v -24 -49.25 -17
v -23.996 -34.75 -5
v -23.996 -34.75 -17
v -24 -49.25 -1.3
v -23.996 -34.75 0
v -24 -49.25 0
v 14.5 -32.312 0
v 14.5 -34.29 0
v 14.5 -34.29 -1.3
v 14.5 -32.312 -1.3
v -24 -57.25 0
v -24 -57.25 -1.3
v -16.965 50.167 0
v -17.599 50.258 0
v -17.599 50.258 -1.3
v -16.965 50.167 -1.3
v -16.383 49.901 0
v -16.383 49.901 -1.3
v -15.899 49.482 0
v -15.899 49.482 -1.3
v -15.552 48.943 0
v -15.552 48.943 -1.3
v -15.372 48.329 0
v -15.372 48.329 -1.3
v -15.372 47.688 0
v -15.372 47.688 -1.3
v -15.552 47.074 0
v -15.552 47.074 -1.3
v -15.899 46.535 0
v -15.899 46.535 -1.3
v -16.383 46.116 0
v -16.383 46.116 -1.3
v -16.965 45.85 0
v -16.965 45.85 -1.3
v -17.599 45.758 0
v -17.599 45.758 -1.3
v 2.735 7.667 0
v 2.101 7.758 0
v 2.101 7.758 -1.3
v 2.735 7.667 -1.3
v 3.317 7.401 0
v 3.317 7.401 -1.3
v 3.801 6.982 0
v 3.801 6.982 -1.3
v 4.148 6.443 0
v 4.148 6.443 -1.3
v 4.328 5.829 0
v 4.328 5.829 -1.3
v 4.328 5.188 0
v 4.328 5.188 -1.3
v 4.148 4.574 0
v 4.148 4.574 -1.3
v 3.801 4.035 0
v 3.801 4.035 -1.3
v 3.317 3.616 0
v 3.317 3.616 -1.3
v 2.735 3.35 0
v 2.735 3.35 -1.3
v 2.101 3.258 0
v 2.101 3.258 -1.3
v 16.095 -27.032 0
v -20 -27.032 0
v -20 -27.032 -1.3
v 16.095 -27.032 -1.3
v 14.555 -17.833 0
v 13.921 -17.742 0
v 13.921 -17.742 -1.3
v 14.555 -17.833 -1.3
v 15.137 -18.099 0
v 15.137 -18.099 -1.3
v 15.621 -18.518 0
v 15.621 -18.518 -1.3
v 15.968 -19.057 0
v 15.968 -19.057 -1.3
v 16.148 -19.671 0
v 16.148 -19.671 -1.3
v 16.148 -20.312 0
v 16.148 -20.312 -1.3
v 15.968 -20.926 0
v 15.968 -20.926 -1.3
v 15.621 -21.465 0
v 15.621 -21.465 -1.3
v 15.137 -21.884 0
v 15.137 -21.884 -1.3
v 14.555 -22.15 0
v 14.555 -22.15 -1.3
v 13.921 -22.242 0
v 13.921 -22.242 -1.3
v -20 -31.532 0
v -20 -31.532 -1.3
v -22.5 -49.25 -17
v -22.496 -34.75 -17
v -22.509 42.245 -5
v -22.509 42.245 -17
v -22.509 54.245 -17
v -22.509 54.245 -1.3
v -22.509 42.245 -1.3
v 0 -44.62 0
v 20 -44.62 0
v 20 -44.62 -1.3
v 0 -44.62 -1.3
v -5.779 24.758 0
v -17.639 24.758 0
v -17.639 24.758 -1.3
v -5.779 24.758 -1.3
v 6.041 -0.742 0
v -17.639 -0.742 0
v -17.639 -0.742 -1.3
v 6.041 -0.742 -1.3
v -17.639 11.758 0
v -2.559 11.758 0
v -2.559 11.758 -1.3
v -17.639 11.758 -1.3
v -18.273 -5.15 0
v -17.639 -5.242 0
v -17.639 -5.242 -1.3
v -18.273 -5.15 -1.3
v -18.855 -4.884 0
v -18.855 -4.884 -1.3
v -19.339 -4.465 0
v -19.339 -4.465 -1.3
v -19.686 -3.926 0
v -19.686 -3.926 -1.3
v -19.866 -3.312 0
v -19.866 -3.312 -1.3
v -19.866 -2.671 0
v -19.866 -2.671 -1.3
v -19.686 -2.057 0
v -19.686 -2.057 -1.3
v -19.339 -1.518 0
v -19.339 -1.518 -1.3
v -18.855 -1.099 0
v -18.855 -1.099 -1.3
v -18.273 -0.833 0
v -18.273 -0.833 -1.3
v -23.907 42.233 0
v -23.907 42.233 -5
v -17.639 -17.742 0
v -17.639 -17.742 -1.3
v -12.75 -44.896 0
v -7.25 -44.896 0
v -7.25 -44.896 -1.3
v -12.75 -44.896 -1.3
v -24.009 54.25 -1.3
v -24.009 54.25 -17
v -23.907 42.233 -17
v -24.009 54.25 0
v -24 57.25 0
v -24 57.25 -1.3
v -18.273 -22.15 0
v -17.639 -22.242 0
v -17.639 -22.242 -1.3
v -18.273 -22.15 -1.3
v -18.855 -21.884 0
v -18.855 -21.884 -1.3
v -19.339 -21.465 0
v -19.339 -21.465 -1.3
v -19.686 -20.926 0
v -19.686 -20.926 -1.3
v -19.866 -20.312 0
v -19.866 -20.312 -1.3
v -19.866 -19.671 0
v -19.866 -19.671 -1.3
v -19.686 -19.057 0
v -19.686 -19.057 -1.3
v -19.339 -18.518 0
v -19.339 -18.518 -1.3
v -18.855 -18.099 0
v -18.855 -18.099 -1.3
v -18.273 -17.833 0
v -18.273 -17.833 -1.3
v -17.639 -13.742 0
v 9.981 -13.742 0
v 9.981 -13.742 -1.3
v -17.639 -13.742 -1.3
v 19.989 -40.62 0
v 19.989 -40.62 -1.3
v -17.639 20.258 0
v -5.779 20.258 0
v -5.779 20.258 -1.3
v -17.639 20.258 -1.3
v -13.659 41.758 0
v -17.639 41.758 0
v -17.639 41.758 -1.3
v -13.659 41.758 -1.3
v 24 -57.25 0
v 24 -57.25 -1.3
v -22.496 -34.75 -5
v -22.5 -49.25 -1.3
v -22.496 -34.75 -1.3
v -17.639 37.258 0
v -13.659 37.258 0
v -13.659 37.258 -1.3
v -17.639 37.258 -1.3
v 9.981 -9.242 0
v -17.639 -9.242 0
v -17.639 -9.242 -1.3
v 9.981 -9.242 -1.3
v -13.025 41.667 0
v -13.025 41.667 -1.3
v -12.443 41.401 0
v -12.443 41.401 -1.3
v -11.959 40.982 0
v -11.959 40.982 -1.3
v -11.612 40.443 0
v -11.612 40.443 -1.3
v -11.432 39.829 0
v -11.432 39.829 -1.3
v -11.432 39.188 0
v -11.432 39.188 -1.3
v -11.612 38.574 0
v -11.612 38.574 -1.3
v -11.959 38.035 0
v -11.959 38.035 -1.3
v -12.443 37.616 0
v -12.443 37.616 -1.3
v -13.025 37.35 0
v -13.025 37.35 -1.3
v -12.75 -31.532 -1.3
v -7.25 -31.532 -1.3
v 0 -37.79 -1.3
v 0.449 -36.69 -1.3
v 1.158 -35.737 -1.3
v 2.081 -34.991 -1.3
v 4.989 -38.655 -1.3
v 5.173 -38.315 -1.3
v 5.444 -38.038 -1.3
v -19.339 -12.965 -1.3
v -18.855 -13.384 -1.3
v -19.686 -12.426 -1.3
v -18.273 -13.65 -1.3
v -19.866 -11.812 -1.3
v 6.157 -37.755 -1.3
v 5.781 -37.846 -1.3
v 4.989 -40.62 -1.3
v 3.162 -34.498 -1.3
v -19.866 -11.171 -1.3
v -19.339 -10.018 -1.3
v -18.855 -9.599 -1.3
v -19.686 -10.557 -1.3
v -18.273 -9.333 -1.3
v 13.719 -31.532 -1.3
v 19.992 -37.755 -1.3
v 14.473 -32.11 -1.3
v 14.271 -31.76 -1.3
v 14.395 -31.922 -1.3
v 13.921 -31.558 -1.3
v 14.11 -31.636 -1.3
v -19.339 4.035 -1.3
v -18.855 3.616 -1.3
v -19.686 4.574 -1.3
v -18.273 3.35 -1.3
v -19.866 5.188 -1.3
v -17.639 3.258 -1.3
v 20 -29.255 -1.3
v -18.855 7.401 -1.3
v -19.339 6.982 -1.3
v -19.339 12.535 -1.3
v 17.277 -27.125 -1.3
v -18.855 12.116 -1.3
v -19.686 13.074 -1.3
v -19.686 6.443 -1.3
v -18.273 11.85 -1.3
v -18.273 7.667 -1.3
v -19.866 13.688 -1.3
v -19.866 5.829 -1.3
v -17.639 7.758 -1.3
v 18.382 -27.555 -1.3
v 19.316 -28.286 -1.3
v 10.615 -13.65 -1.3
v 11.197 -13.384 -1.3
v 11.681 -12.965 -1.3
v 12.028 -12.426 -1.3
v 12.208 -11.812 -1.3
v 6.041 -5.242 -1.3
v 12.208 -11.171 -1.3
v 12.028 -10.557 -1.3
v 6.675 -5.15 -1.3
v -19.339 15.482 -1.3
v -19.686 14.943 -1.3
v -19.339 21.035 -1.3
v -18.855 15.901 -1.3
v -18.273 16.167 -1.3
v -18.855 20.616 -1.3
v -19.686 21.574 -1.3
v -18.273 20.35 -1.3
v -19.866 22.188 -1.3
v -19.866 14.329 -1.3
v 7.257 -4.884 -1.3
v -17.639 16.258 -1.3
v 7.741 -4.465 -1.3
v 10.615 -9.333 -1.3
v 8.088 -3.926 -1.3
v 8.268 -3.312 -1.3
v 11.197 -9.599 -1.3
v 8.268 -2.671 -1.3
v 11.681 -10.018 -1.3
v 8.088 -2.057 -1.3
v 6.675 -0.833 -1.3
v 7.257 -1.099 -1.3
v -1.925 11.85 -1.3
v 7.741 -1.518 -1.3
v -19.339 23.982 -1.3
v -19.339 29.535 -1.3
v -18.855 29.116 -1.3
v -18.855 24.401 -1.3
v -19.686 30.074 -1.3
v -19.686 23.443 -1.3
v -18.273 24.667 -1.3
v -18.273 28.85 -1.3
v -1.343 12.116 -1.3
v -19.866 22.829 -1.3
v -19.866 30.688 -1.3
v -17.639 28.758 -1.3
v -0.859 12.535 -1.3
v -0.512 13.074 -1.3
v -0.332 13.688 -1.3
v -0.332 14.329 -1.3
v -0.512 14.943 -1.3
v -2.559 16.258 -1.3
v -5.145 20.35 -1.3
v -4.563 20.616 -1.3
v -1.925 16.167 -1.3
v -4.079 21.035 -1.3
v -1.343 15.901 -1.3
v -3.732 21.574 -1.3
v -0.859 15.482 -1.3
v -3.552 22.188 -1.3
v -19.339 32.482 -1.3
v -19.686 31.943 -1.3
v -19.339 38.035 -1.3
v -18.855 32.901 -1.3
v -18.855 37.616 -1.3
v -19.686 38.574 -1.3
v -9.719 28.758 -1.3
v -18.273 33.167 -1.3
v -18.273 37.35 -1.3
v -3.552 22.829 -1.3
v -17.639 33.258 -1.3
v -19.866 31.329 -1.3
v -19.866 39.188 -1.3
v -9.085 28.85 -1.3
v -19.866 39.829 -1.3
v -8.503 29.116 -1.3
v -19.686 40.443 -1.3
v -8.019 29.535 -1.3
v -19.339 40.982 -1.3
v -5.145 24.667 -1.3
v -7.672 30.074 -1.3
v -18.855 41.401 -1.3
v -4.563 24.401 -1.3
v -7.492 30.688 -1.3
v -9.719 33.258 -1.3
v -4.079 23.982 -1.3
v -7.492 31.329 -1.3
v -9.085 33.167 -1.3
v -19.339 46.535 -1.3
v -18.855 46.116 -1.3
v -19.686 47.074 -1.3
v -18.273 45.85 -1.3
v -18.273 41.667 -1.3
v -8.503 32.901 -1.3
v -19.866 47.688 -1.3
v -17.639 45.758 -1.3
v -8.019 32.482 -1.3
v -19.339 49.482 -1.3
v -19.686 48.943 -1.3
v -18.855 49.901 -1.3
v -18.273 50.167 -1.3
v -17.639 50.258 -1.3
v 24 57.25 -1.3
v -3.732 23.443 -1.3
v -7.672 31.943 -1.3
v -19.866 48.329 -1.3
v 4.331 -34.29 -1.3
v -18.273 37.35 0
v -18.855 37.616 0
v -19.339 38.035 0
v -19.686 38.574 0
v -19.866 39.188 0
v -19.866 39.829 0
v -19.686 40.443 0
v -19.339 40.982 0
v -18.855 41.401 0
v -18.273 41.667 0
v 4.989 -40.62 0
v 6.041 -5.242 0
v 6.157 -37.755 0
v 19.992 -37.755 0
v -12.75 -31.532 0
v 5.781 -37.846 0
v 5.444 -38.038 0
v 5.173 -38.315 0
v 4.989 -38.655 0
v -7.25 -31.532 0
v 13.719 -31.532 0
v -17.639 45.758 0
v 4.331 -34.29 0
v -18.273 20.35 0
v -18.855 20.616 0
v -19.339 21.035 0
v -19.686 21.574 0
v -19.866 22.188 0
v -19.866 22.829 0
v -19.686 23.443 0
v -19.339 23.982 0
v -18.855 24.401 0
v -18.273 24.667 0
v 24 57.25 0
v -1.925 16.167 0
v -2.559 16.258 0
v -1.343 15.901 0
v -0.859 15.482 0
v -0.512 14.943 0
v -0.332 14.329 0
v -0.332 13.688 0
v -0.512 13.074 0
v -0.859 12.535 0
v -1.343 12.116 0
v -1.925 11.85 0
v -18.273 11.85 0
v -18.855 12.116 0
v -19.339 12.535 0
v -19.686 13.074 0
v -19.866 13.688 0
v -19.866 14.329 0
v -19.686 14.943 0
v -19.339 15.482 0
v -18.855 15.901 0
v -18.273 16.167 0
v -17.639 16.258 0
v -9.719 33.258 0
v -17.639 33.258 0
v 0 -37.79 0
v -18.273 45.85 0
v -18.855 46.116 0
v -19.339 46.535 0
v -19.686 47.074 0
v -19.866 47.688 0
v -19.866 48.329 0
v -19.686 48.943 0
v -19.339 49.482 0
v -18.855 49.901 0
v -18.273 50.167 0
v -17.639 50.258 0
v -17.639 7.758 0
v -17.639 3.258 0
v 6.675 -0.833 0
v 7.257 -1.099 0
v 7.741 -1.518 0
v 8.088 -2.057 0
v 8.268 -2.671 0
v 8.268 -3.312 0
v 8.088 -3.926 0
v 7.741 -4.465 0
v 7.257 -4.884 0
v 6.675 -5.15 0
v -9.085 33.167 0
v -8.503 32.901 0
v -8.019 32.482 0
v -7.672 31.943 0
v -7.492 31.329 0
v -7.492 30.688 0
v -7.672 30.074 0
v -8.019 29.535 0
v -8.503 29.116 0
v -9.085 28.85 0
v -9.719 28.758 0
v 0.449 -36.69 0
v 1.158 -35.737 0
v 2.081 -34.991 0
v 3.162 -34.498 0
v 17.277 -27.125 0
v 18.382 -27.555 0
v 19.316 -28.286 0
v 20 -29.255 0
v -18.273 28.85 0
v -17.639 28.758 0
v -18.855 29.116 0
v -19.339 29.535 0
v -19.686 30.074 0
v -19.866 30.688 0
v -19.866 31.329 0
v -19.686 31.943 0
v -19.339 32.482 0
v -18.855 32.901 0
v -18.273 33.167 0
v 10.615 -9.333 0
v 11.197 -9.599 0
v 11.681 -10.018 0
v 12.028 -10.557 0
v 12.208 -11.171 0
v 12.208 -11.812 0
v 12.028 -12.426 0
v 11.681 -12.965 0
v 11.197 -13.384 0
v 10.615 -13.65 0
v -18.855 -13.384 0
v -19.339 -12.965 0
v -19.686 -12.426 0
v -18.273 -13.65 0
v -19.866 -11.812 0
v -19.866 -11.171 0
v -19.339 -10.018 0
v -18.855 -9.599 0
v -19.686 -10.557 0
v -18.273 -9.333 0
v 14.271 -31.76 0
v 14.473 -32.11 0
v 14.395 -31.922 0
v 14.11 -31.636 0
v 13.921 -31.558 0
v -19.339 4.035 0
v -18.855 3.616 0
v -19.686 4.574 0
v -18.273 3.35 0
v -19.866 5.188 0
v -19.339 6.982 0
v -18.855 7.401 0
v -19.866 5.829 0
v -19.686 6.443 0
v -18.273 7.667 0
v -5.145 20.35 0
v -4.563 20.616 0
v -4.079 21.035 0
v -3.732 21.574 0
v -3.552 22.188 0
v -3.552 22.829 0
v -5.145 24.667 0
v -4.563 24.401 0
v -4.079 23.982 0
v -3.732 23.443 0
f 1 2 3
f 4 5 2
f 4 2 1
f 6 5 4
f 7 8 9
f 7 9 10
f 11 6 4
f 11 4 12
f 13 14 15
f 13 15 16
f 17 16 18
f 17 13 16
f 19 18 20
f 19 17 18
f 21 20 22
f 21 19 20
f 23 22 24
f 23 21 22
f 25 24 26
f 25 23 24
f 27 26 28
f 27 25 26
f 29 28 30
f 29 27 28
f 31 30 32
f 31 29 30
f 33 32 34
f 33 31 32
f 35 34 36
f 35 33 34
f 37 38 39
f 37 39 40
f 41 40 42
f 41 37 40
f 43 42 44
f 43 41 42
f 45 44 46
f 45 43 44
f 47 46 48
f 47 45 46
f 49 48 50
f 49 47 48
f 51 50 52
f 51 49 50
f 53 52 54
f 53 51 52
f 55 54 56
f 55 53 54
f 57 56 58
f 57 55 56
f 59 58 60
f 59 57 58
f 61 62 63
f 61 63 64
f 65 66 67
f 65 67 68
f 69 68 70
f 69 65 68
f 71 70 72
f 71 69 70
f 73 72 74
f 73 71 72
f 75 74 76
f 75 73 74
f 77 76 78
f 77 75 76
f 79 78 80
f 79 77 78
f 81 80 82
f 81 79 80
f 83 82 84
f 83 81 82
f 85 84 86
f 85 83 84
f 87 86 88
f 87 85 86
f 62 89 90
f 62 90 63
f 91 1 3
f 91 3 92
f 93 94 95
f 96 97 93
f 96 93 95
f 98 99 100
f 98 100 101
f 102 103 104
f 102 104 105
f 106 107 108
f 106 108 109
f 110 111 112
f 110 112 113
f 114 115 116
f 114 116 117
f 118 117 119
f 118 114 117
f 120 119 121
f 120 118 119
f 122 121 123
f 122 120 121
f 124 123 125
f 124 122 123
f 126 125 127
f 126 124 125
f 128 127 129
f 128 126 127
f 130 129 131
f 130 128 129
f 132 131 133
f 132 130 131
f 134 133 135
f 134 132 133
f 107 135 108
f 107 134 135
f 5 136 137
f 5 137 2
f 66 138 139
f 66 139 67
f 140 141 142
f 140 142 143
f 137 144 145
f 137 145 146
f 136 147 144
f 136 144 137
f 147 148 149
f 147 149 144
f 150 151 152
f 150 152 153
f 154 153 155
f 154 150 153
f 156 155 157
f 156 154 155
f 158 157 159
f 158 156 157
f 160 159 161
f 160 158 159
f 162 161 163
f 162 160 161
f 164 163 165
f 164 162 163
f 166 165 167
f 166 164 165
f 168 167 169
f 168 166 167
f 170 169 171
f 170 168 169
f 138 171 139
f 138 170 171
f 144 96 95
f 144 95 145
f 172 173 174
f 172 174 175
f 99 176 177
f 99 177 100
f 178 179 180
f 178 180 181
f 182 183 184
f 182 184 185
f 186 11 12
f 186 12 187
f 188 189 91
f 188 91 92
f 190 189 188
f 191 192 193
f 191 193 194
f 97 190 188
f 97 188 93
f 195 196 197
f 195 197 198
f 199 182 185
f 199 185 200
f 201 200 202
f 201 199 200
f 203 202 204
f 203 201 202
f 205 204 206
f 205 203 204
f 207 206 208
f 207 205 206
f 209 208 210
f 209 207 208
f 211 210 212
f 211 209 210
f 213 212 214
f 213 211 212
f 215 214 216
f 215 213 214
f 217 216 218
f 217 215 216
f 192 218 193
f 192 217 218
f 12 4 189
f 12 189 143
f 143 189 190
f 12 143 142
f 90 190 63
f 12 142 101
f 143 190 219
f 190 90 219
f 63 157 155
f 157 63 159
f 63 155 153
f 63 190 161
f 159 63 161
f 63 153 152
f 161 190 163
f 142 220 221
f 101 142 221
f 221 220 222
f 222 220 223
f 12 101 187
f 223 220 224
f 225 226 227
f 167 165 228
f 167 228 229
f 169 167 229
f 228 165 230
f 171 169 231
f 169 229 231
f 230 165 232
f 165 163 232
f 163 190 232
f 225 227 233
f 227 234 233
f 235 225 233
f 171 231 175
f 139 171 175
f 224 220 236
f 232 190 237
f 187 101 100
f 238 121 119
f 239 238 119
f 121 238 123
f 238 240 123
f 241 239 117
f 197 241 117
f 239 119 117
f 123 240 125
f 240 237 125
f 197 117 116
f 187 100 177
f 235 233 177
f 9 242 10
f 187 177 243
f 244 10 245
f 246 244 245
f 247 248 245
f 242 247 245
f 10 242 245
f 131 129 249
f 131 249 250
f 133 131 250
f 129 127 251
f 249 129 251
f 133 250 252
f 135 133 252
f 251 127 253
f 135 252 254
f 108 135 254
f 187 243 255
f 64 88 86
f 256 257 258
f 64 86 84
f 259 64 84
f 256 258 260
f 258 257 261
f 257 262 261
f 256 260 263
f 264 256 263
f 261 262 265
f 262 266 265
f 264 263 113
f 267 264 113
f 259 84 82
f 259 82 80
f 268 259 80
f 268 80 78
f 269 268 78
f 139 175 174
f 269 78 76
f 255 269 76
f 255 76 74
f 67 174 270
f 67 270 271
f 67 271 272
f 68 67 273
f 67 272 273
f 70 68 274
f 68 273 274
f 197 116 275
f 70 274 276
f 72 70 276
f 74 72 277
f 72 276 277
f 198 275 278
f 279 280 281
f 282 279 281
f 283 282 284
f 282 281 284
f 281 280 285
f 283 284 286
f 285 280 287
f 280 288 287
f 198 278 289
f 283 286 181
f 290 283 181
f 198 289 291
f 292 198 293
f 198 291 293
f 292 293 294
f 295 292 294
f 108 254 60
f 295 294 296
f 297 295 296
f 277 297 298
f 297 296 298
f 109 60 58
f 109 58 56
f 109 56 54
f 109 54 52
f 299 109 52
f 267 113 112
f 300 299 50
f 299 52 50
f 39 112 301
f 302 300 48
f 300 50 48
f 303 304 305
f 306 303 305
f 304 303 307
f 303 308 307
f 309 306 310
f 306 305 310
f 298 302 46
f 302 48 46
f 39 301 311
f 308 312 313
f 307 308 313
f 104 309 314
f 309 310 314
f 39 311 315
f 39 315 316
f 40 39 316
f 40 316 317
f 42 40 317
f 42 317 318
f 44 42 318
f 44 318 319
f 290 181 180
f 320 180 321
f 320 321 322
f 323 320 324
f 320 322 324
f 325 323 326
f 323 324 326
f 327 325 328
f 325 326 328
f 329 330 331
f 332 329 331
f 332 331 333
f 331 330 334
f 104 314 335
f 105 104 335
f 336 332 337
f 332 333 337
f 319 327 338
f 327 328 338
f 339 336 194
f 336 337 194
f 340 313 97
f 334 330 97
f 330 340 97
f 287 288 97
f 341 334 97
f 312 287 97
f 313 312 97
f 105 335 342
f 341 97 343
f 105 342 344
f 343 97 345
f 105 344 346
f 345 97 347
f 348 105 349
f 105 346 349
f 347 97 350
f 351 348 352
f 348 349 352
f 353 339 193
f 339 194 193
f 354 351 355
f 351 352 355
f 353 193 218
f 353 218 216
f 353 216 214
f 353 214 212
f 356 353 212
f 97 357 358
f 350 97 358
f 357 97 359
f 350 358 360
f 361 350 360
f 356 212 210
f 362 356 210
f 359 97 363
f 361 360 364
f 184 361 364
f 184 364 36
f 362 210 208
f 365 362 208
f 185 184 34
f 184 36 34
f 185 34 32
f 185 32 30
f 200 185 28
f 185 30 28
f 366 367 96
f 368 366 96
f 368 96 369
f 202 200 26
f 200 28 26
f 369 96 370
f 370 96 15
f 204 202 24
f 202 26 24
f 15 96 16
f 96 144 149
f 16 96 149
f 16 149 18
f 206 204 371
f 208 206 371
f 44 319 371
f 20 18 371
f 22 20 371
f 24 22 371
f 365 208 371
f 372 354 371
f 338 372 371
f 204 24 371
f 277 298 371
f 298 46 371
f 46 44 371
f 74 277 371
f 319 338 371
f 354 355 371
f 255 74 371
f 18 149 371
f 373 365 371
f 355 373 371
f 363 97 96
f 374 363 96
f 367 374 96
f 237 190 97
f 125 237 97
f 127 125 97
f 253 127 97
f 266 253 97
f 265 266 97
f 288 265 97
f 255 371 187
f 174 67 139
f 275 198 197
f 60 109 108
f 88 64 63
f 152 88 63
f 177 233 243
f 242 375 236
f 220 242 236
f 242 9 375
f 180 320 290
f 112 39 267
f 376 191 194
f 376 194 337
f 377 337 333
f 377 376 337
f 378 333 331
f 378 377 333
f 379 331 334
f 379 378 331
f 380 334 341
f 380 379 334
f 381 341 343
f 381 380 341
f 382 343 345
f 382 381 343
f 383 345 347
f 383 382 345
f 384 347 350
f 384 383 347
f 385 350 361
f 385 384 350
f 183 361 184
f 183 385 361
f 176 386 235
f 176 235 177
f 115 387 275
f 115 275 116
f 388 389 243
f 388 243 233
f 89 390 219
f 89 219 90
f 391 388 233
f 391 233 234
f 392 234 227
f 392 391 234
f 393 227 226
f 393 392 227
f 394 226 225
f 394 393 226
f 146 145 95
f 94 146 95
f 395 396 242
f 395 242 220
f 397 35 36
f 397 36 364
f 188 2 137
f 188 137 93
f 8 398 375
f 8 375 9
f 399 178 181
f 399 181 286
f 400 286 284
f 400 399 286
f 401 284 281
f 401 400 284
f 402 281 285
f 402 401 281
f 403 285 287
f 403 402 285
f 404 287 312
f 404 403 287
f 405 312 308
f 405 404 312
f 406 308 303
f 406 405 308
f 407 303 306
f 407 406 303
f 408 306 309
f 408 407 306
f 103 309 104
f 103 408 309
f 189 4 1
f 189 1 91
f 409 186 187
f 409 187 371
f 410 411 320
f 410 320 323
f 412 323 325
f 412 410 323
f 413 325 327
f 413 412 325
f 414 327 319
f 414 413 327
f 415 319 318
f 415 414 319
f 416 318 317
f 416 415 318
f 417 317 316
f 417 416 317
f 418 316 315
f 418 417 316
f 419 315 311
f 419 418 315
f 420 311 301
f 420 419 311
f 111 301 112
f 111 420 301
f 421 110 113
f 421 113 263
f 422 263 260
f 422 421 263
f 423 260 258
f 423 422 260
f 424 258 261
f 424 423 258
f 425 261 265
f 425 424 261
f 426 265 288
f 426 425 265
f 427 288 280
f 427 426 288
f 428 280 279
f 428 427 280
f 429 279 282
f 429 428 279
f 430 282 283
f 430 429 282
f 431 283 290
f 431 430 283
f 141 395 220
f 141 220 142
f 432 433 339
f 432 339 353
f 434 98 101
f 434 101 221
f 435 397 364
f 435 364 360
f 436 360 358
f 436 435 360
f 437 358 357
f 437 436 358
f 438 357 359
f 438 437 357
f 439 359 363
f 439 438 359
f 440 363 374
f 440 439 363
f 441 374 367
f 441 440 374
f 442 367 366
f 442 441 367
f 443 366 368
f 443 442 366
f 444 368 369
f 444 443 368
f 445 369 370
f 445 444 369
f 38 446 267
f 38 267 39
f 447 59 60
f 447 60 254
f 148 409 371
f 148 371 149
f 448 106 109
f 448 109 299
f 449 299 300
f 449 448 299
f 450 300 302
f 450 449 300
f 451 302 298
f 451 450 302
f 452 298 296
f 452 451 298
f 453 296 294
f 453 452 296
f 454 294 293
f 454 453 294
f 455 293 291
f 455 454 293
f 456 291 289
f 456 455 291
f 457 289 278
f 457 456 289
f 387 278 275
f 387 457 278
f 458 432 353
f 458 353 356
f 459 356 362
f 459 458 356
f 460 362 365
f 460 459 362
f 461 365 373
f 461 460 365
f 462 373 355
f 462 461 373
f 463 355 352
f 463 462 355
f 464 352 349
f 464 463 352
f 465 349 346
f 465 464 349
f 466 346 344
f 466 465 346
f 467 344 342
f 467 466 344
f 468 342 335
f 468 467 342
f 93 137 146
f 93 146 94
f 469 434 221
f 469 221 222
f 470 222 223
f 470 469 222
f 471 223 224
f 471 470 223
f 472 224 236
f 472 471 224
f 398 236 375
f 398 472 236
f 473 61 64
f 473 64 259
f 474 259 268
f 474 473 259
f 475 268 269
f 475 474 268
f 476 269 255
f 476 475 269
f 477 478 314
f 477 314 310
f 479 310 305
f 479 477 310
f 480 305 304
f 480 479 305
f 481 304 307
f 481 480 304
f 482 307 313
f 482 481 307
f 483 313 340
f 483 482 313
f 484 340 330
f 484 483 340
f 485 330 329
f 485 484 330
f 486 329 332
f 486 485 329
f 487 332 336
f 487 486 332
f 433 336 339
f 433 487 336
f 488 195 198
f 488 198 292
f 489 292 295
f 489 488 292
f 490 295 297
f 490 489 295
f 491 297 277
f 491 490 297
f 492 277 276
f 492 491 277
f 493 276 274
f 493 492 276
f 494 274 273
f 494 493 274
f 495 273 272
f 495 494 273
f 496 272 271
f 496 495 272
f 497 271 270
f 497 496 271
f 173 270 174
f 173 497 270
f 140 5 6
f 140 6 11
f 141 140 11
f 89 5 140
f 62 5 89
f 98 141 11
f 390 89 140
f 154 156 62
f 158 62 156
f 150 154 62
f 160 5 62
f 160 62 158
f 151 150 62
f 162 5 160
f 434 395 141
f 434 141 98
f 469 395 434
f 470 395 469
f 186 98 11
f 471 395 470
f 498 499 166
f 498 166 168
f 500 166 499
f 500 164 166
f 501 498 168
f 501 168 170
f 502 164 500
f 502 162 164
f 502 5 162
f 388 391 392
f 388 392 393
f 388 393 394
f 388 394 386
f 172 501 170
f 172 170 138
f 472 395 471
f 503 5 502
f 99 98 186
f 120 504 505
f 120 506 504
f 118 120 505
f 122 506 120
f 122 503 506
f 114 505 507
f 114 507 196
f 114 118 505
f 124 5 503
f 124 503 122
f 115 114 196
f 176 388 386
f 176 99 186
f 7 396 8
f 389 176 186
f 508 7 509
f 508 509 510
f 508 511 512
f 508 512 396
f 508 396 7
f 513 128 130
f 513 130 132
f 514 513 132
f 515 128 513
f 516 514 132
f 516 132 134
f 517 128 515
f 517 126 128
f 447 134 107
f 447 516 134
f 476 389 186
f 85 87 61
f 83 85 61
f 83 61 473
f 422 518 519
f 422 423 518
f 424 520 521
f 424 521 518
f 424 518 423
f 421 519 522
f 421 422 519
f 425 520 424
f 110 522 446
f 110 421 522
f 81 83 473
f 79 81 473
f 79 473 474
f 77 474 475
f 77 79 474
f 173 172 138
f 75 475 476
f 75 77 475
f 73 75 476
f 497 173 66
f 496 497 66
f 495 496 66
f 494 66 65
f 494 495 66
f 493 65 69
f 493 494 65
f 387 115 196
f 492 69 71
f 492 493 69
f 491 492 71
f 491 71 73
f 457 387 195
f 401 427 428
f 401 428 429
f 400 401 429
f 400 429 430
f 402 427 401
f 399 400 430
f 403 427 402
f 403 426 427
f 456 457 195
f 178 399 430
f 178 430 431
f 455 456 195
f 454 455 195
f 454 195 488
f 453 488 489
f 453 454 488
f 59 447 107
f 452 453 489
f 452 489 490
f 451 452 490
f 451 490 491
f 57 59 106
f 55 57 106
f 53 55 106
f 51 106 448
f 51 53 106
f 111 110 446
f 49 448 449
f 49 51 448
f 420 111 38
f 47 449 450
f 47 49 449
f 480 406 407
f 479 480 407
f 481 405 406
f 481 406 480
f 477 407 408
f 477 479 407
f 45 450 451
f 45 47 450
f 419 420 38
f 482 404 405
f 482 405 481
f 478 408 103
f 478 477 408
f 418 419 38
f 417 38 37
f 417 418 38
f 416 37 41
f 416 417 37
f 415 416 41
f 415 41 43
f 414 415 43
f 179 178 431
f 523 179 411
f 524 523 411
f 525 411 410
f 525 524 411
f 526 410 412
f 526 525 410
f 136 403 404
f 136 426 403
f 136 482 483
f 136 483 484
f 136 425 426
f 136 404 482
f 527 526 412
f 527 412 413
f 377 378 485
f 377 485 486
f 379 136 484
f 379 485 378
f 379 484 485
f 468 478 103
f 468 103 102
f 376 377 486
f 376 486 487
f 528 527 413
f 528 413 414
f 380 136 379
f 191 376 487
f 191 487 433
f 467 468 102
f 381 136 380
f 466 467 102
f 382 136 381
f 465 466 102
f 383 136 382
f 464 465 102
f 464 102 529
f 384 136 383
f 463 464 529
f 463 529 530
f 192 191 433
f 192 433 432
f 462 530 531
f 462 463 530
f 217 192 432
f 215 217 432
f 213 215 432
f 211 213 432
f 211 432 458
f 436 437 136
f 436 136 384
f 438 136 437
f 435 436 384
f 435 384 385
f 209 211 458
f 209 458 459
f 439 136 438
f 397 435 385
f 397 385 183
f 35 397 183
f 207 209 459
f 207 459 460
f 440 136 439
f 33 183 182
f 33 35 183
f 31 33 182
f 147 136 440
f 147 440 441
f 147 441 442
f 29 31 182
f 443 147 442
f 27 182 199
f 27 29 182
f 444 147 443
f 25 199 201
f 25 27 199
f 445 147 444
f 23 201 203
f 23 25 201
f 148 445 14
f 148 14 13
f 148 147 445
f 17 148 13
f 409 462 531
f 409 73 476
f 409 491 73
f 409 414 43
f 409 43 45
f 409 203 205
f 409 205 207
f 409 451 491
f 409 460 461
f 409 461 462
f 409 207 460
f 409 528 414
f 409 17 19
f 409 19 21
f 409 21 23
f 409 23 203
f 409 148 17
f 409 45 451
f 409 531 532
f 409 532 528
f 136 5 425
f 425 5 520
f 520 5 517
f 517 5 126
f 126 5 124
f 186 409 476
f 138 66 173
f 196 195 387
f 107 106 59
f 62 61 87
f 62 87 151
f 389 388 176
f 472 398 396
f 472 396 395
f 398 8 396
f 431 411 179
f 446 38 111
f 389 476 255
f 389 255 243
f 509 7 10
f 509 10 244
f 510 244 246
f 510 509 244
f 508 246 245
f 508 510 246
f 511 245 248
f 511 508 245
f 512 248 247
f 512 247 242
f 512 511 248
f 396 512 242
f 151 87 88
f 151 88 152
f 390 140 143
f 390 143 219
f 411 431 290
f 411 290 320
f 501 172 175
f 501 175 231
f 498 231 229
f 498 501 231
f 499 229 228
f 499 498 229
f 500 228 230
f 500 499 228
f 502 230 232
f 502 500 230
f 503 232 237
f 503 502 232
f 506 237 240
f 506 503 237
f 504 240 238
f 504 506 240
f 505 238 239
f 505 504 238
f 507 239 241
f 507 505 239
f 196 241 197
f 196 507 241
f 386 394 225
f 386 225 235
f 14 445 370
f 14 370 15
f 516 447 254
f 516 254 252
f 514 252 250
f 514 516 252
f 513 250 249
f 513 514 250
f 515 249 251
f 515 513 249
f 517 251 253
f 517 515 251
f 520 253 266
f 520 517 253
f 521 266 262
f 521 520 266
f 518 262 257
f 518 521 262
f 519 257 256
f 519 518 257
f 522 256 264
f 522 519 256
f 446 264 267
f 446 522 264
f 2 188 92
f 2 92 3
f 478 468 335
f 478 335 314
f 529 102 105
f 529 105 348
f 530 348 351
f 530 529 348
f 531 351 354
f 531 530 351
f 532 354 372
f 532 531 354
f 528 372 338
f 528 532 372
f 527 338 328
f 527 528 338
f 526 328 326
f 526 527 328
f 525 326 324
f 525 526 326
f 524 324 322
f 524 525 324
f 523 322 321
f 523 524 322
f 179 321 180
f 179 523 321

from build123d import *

# Parameters (mm, degrees)
F1_DEPTH = 1.3
F2_DEPTH = 17
F4_DEPTH = 5


# Not quite as in the source:
# - a feature names something its author has since deleted; it is built from what else it names


with BuildPart() as f1:
    # F0 (on Top) → F1 (new body)
    with BuildSketch(Plane.XY):
        Polygon((24, 57.25), (-24, 57.25), (-24.0091441598, 54.25), (-22.5091511277, 54.2454279414), (-22.5091511277, 42.2454279414), (-22.4957785658, -34.7500035641), (-22.5, -49.25), (-24, -49.25), (-24, -57.25), (24, -57.25), align=None)
        with BuildLine():
            Line((13.9209458456, -22.2416133583), (-17.6390541544, -22.2416133583))
            ThreePointArc((-17.6390541544, -22.2416133583), (-19.8890541544, -19.9916133583), (-17.6390541544, -17.7416133583))
            Line((-17.6390541544, -17.7416133583), (13.9209458456, -17.7416133583))
            ThreePointArc((13.9209458456, -17.7416133583), (16.1709458456, -19.9916133583), (13.9209458456, -22.2416133583))
        make_face(mode=Mode.SUBTRACT)
        with BuildLine():
            Line((9.9809458456, -13.7416133583), (-17.6390541544, -13.7416133583))
            ThreePointArc((-17.6390541544, -13.7416133583), (-19.8890541544, -11.4916133583), (-17.6390541544, -9.2416133583))
            Line((-17.6390541544, -9.2416133583), (9.9809458456, -9.2416133583))
            ThreePointArc((9.9809458456, -9.2416133583), (12.2309458456, -11.4916133583), (9.9809458456, -13.7416133583))
        make_face(mode=Mode.SUBTRACT)
        with BuildLine():
            Line((6.0409458456, -5.2416133583), (-17.6390541544, -5.2416133583))
            ThreePointArc((-17.6390541544, -5.2416133583), (-19.8890541544, -2.9916133583), (-17.6390541544, -0.7416133583))
            Line((-17.6390541544, -0.7416133583), (6.0409458456, -0.7416133583))
            ThreePointArc((6.0409458456, -0.7416133583), (8.2909458456, -2.9916133583), (6.0409458456, -5.2416133583))
        make_face(mode=Mode.SUBTRACT)
        with BuildLine():
            Line((-19.9999999992, -31.5317022603), (-19.9999999992, -27.0317022603))
            Line((-19.9999999992, -27.0317022603), (16.0951670268, -27.0317022603))
            ThreePointArc((16.0951670268, -27.0317022603), (18.3824934665, -27.555243649), (19.9999999704, -29.25513498))
            Line((19.9999999704, -29.25513498), (19.991580365, -37.75513498))
            Line((19.991580365, -37.75513498), (6.1573753969, -37.7551350426))
            ThreePointArc((6.1573753969, -37.7551350426), (5.4441089744, -38.037790108), (4.9890264818, -38.6554816172))
            Line((4.9890264818, -38.6554816172), (4.9890264818, -40.6197120801))
            Line((4.9890264818, -40.6197120801), (19.9890264818, -40.6197120801))
            Line((19.9890264818, -40.6197120801), (20, -44.6197120801))
            Line((20, -44.6197120801), (0, -44.6197120801))
            Line((0, -44.6197120801), (0, -37.7900532508))
            ThreePointArc((0, -37.7900532508), (1.5958871284, -35.3350022858), (4.3312619815, -34.2900834468))
            Line((4.3312619815, -34.2900834468), (14.5000001306, -34.2900834468))
            Line((14.5000001306, -34.2900834468), (14.5000000048, -32.3122422563))
            ThreePointArc((14.5000000048, -32.3122422563), (14.2713851276, -31.7603171319), (13.7194600008, -31.5317022603))
            Line((13.7194600008, -31.5317022603), (-7.2499999992, -31.5317022603))
            Line((-7.2499999992, -31.5317022603), (-7.2499999992, -44.8960133593))
            Line((-7.2499999992, -44.8960133593), (-12.7499999992, -44.8960133593))
            Line((-12.7499999992, -44.8960133593), (-12.7499999992, -31.5317022603))
            Line((-12.7499999992, -31.5317022603), (-19.9999999992, -31.5317022603))
        make_face(mode=Mode.SUBTRACT)
        with BuildLine():
            Line((2.1009458456, 3.2583866417), (-17.6390541544, 3.2583866417))
            ThreePointArc((-17.6390541544, 3.2583866417), (-19.8890541544, 5.5083866417), (-17.6390541544, 7.7583866417))
            Line((-17.6390541544, 7.7583866417), (2.1009458456, 7.7583866417))
            ThreePointArc((2.1009458456, 7.7583866417), (4.3509458456, 5.5083866417), (2.1009458456, 3.2583866417))
        make_face(mode=Mode.SUBTRACT)
        with BuildLine():
            Line((-2.5590541544, 11.7583866417), (-17.6390541544, 11.7583866417))
            ThreePointArc((-17.6390541544, 11.7583866417), (-19.8890541544, 14.0083866417), (-17.6390541544, 16.2583866417))
            Line((-17.6390541544, 16.2583866417), (-2.5590541544, 16.2583866417))
            ThreePointArc((-2.5590541544, 16.2583866417), (-0.3090541544, 14.0083866417), (-2.5590541544, 11.7583866417))
        make_face(mode=Mode.SUBTRACT)
        with BuildLine():
            Line((-5.7790541544, 20.2583866417), (-17.6390541544, 20.2583866417))
            ThreePointArc((-17.6390541544, 20.2583866417), (-19.8890541544, 22.5083866417), (-17.6390541544, 24.7583866417))
            Line((-17.6390541544, 24.7583866417), (-5.7790541544, 24.7583866417))
            ThreePointArc((-5.7790541544, 24.7583866417), (-3.5290541544, 22.5083866417), (-5.7790541544, 20.2583866417))
        make_face(mode=Mode.SUBTRACT)
        with BuildLine():
            Line((-9.7190541544, 28.7583866417), (-17.6390541544, 28.7583866417))
            ThreePointArc((-17.6390541544, 28.7583866417), (-19.8890541544, 31.0083866417), (-17.6390541544, 33.2583866417))
            Line((-17.6390541544, 33.2583866417), (-9.7190541544, 33.2583866417))
            ThreePointArc((-9.7190541544, 33.2583866417), (-7.4690541544, 31.0083866417), (-9.7190541544, 28.7583866417))
        make_face(mode=Mode.SUBTRACT)
        with BuildLine():
            Line((-13.6590541544, 37.2583866417), (-17.6390541544, 37.2583866417))
            ThreePointArc((-17.6390541544, 37.2583866417), (-19.8890541544, 39.5083866417), (-17.6390541544, 41.7583866417))
            Line((-17.6390541544, 41.7583866417), (-13.6590541544, 41.7583866417))
            ThreePointArc((-13.6590541544, 41.7583866417), (-11.4090541544, 39.5083866417), (-13.6590541544, 37.2583866417))
        make_face(mode=Mode.SUBTRACT)
        with BuildLine():
            Line((-17.5990541544, 45.7583866417), (-17.6390541544, 45.7583866417))
            ThreePointArc((-17.6390541544, 45.7583866417), (-19.8890541544, 48.0083866417), (-17.6390541544, 50.2583866417))
            Line((-17.6390541544, 50.2583866417), (-17.5990541544, 50.2583866417))
            ThreePointArc((-17.5990541544, 50.2583866417), (-15.3490541544, 48.0083866417), (-17.5990541544, 45.7583866417))
        make_face(mode=Mode.SUBTRACT)
    extrude(amount=-F1_DEPTH)

    # F0 (on Top) → F2 (join)
    with BuildSketch(Plane.XY):
        Polygon((-22.5091511277, 54.2454279414), (-24.0091441598, 54.25), (-23.9065294749, 42.2334950591), (-22.5091511277, 42.2454279414), align=None)
        Polygon((-22.4957785658, -34.7500035641), (-23.9957785658, -34.7500035641), (-24, -49.25), (-22.5, -49.25), align=None)
    extrude(amount=-F2_DEPTH)

    # F0 (on Top) → F4 (join)
    with BuildSketch(Plane.XY):
        Polygon((-22.5091511277, 42.2454279414), (-23.9065294749, 42.2334950591), (-23.9957785658, -34.7500035641), (-22.4957785658, -34.7500035641), align=None)
    extrude(amount=-F4_DEPTH)


solid = f1.part
